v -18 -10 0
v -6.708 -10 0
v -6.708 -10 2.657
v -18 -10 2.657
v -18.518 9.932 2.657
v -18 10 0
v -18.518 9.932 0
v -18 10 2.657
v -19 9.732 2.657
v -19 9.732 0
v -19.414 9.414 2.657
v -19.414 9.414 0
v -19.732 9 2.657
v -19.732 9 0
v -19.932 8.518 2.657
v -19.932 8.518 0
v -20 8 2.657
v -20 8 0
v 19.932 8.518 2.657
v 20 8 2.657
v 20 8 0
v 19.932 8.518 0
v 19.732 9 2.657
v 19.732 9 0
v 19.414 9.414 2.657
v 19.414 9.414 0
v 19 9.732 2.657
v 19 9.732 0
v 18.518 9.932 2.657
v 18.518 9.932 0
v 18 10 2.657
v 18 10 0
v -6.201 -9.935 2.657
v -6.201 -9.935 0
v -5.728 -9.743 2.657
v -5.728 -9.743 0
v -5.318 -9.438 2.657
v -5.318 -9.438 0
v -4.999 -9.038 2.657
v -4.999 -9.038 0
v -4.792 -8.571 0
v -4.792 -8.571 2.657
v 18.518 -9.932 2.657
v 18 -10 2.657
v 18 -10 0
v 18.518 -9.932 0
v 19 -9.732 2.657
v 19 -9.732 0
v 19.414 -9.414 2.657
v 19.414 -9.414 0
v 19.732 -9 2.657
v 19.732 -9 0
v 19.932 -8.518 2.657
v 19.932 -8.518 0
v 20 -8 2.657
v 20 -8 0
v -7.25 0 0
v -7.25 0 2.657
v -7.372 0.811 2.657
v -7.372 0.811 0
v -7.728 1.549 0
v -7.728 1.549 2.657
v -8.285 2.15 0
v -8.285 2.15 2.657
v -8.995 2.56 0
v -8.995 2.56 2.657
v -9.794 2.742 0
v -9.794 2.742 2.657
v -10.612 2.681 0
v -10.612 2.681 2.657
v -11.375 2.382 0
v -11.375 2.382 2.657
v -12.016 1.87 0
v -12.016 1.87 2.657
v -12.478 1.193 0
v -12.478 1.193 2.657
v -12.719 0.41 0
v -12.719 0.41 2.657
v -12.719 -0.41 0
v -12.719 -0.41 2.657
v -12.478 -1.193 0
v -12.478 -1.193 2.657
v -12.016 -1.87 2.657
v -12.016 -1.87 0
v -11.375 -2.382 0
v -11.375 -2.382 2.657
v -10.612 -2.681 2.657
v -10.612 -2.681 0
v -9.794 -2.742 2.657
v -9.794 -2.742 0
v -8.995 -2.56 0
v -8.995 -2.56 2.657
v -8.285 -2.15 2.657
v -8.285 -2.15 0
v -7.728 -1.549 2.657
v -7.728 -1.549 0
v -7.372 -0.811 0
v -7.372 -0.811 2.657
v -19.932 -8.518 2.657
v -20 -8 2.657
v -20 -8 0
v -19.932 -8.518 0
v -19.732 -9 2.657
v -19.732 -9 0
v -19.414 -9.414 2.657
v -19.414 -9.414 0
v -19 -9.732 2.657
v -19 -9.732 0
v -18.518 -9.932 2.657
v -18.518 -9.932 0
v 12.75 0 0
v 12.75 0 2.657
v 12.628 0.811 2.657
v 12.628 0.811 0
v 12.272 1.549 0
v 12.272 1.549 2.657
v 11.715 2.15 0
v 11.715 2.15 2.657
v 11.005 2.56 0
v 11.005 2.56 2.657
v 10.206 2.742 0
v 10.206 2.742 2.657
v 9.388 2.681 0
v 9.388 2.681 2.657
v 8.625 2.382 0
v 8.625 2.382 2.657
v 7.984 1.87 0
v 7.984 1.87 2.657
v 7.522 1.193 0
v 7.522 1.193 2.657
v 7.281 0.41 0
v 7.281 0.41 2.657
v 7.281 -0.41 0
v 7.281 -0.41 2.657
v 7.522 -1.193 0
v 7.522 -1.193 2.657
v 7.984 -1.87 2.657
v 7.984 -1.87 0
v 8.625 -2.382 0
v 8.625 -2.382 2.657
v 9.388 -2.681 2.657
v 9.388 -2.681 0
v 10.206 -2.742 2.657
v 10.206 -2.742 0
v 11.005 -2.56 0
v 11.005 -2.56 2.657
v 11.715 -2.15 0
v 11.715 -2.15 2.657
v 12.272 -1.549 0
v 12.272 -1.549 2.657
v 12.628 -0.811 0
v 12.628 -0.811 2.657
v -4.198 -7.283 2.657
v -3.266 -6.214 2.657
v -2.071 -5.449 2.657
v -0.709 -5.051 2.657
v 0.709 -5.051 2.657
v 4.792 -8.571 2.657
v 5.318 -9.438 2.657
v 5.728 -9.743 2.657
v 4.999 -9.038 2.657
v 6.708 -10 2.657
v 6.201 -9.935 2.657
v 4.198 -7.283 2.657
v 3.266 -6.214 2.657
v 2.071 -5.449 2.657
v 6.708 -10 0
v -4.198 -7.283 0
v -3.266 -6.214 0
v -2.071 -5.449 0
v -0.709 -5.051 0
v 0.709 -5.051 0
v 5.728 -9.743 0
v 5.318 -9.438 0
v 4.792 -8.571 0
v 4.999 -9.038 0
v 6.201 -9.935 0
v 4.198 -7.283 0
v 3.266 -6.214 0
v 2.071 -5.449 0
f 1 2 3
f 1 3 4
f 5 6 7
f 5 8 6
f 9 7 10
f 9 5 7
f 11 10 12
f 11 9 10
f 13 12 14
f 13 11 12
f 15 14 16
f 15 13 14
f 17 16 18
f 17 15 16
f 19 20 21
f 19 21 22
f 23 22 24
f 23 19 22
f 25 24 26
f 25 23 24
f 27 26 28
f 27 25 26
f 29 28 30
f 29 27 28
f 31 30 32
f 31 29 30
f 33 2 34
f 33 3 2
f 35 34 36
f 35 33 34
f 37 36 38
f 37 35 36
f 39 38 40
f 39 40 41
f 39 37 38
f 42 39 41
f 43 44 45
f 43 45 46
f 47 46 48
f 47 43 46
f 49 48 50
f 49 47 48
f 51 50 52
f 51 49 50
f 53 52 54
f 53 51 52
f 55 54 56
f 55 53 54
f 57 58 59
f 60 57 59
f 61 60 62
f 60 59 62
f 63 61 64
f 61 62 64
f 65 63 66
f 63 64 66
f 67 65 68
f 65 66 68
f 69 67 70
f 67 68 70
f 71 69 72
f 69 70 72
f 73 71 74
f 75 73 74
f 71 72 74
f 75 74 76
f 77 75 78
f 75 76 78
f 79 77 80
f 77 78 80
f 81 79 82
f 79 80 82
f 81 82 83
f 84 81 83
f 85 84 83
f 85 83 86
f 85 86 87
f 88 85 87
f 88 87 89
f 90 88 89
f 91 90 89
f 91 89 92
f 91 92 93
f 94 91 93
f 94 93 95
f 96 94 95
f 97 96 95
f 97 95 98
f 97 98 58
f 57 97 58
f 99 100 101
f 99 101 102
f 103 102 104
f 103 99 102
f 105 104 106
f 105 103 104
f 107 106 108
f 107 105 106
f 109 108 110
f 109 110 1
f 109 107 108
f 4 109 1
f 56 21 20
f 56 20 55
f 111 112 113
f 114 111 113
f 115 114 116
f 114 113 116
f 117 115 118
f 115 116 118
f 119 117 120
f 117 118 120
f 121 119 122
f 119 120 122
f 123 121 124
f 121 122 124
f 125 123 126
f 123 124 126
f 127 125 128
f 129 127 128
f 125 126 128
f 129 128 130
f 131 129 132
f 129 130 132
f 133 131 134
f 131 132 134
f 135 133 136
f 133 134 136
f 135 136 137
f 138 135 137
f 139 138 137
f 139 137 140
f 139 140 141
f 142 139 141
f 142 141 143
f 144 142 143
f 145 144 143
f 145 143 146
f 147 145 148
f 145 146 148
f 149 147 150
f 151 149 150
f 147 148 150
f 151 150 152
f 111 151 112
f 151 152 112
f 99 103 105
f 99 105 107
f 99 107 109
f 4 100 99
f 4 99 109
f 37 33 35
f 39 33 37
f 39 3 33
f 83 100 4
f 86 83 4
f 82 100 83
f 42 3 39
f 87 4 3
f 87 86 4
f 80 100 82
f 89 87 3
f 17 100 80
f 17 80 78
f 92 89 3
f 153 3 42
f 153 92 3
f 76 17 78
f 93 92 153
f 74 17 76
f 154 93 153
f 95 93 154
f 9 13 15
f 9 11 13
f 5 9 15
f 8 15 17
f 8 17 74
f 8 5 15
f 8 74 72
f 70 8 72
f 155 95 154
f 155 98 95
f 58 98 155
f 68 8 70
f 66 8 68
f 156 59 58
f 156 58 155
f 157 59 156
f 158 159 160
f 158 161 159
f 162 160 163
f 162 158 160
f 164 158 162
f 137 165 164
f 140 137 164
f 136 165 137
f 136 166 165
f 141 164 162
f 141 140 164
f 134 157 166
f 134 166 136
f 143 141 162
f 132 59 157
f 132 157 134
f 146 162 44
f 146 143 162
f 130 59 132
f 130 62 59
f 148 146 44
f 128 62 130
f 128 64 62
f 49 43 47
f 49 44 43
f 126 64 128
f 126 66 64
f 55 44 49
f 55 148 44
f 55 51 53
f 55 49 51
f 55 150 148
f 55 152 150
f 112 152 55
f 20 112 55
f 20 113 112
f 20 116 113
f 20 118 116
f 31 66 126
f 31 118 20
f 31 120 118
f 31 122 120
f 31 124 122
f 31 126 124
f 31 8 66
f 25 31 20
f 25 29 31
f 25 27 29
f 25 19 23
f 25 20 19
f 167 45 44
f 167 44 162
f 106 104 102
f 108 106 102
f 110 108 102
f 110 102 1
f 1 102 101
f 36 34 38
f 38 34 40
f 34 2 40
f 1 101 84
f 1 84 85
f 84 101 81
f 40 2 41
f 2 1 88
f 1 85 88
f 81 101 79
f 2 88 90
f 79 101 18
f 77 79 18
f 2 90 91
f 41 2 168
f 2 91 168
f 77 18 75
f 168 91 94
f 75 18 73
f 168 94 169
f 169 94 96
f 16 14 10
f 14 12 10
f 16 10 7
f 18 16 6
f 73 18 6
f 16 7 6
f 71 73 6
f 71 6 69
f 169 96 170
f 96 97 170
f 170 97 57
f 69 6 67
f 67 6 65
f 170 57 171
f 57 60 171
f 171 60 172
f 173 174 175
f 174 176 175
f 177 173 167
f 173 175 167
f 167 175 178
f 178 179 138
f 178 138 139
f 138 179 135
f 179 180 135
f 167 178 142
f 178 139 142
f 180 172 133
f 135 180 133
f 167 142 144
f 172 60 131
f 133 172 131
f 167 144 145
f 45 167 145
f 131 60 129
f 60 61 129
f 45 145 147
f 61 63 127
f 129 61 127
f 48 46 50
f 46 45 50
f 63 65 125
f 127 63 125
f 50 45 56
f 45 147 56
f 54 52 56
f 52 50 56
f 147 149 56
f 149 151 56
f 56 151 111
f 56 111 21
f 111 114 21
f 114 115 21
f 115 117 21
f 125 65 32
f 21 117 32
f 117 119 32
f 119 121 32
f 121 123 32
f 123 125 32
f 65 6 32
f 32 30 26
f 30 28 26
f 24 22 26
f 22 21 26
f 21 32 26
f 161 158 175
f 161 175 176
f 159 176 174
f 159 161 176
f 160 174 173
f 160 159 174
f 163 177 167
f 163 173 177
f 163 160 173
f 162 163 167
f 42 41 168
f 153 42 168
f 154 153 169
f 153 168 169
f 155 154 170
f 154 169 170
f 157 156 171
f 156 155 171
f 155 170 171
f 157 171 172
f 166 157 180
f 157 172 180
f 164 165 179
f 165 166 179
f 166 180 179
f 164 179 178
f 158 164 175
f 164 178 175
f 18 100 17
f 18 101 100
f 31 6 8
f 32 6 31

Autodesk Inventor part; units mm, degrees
ref_plane "YZ Plane" through (0, 0, 0) normal (1, 0, 0) x (0, 1, 0)
ref_plane "XZ Plane" through (0, 0, 0) normal (0, 1, 0) x (-1, 0, 0)
ref_plane "XY Plane" through (0, 0, 0) normal (0, 0, 1) x (1, 0, 0)
sketch "Sketch1" plane through (0, 0, 0) normal (0, 0, 1) x (1, 0, 0)
  line L0 (-20, 10) -> (20, 10)
  line L1 (20, 10) -> (20, -10)
  line L2 (-20, -10) -> (-20, 10)
  arc A0 (5, -10) -> (-5, -10) centre (0, -10) ccw
  line L3 (20, -10) -> (5, -10)
  line L4 (-5, -10) -> (-20, -10)
  point P0 (0, 0)
  dimension "d0" = 40
  dimension "d1" = 20
  dimension "d2" = 20
  dimension "d3" = 10
  dimension "d4" = 10
  dimension "d5" = 20
  dimension "d6" = 20
  dimension "d7" = 15
extrude "Extrusion1" add sketch "Sketch1" along normal blind 2.6568
sketch "Sketch2" plane through (0, 0, 2.6568) normal (0, 0, 1) x (1, 0, 0)
  line L0 (20, 10) -> (-20, 10) projected
  line L1 (-20, 10) -> (-20, -10) projected
  circle A0 centre (-10, 0) radius 2.75
  circle A1 centre (10, 0) radius 2.75
  point P0 (0, 0)
  dimension "d23" = 5.5
  dimension "d24" = 10
  dimension "d25" = 10
  dimension "d28" = 20
extrude "Extrusion2" cut sketch "Sketch2" against normal through all
fillet "Fillet1" radius 2 4 edges at (20, -10, 1.3284) (-20, -10, 1.3284) (-5, -10, 1.3284) (5, -10, 1.3284)
fillet "Fillet2" radius 2 2 edges at (20, 10, 1.3284) (-20, 10, 1.3284)
equation "\"d2\" = 0.5 * d0"
equation "\"d3\" = 0.5 * d1"
equation "\"d25\" = d24"
properties part number "30289-01" material "Steel, Mild"
